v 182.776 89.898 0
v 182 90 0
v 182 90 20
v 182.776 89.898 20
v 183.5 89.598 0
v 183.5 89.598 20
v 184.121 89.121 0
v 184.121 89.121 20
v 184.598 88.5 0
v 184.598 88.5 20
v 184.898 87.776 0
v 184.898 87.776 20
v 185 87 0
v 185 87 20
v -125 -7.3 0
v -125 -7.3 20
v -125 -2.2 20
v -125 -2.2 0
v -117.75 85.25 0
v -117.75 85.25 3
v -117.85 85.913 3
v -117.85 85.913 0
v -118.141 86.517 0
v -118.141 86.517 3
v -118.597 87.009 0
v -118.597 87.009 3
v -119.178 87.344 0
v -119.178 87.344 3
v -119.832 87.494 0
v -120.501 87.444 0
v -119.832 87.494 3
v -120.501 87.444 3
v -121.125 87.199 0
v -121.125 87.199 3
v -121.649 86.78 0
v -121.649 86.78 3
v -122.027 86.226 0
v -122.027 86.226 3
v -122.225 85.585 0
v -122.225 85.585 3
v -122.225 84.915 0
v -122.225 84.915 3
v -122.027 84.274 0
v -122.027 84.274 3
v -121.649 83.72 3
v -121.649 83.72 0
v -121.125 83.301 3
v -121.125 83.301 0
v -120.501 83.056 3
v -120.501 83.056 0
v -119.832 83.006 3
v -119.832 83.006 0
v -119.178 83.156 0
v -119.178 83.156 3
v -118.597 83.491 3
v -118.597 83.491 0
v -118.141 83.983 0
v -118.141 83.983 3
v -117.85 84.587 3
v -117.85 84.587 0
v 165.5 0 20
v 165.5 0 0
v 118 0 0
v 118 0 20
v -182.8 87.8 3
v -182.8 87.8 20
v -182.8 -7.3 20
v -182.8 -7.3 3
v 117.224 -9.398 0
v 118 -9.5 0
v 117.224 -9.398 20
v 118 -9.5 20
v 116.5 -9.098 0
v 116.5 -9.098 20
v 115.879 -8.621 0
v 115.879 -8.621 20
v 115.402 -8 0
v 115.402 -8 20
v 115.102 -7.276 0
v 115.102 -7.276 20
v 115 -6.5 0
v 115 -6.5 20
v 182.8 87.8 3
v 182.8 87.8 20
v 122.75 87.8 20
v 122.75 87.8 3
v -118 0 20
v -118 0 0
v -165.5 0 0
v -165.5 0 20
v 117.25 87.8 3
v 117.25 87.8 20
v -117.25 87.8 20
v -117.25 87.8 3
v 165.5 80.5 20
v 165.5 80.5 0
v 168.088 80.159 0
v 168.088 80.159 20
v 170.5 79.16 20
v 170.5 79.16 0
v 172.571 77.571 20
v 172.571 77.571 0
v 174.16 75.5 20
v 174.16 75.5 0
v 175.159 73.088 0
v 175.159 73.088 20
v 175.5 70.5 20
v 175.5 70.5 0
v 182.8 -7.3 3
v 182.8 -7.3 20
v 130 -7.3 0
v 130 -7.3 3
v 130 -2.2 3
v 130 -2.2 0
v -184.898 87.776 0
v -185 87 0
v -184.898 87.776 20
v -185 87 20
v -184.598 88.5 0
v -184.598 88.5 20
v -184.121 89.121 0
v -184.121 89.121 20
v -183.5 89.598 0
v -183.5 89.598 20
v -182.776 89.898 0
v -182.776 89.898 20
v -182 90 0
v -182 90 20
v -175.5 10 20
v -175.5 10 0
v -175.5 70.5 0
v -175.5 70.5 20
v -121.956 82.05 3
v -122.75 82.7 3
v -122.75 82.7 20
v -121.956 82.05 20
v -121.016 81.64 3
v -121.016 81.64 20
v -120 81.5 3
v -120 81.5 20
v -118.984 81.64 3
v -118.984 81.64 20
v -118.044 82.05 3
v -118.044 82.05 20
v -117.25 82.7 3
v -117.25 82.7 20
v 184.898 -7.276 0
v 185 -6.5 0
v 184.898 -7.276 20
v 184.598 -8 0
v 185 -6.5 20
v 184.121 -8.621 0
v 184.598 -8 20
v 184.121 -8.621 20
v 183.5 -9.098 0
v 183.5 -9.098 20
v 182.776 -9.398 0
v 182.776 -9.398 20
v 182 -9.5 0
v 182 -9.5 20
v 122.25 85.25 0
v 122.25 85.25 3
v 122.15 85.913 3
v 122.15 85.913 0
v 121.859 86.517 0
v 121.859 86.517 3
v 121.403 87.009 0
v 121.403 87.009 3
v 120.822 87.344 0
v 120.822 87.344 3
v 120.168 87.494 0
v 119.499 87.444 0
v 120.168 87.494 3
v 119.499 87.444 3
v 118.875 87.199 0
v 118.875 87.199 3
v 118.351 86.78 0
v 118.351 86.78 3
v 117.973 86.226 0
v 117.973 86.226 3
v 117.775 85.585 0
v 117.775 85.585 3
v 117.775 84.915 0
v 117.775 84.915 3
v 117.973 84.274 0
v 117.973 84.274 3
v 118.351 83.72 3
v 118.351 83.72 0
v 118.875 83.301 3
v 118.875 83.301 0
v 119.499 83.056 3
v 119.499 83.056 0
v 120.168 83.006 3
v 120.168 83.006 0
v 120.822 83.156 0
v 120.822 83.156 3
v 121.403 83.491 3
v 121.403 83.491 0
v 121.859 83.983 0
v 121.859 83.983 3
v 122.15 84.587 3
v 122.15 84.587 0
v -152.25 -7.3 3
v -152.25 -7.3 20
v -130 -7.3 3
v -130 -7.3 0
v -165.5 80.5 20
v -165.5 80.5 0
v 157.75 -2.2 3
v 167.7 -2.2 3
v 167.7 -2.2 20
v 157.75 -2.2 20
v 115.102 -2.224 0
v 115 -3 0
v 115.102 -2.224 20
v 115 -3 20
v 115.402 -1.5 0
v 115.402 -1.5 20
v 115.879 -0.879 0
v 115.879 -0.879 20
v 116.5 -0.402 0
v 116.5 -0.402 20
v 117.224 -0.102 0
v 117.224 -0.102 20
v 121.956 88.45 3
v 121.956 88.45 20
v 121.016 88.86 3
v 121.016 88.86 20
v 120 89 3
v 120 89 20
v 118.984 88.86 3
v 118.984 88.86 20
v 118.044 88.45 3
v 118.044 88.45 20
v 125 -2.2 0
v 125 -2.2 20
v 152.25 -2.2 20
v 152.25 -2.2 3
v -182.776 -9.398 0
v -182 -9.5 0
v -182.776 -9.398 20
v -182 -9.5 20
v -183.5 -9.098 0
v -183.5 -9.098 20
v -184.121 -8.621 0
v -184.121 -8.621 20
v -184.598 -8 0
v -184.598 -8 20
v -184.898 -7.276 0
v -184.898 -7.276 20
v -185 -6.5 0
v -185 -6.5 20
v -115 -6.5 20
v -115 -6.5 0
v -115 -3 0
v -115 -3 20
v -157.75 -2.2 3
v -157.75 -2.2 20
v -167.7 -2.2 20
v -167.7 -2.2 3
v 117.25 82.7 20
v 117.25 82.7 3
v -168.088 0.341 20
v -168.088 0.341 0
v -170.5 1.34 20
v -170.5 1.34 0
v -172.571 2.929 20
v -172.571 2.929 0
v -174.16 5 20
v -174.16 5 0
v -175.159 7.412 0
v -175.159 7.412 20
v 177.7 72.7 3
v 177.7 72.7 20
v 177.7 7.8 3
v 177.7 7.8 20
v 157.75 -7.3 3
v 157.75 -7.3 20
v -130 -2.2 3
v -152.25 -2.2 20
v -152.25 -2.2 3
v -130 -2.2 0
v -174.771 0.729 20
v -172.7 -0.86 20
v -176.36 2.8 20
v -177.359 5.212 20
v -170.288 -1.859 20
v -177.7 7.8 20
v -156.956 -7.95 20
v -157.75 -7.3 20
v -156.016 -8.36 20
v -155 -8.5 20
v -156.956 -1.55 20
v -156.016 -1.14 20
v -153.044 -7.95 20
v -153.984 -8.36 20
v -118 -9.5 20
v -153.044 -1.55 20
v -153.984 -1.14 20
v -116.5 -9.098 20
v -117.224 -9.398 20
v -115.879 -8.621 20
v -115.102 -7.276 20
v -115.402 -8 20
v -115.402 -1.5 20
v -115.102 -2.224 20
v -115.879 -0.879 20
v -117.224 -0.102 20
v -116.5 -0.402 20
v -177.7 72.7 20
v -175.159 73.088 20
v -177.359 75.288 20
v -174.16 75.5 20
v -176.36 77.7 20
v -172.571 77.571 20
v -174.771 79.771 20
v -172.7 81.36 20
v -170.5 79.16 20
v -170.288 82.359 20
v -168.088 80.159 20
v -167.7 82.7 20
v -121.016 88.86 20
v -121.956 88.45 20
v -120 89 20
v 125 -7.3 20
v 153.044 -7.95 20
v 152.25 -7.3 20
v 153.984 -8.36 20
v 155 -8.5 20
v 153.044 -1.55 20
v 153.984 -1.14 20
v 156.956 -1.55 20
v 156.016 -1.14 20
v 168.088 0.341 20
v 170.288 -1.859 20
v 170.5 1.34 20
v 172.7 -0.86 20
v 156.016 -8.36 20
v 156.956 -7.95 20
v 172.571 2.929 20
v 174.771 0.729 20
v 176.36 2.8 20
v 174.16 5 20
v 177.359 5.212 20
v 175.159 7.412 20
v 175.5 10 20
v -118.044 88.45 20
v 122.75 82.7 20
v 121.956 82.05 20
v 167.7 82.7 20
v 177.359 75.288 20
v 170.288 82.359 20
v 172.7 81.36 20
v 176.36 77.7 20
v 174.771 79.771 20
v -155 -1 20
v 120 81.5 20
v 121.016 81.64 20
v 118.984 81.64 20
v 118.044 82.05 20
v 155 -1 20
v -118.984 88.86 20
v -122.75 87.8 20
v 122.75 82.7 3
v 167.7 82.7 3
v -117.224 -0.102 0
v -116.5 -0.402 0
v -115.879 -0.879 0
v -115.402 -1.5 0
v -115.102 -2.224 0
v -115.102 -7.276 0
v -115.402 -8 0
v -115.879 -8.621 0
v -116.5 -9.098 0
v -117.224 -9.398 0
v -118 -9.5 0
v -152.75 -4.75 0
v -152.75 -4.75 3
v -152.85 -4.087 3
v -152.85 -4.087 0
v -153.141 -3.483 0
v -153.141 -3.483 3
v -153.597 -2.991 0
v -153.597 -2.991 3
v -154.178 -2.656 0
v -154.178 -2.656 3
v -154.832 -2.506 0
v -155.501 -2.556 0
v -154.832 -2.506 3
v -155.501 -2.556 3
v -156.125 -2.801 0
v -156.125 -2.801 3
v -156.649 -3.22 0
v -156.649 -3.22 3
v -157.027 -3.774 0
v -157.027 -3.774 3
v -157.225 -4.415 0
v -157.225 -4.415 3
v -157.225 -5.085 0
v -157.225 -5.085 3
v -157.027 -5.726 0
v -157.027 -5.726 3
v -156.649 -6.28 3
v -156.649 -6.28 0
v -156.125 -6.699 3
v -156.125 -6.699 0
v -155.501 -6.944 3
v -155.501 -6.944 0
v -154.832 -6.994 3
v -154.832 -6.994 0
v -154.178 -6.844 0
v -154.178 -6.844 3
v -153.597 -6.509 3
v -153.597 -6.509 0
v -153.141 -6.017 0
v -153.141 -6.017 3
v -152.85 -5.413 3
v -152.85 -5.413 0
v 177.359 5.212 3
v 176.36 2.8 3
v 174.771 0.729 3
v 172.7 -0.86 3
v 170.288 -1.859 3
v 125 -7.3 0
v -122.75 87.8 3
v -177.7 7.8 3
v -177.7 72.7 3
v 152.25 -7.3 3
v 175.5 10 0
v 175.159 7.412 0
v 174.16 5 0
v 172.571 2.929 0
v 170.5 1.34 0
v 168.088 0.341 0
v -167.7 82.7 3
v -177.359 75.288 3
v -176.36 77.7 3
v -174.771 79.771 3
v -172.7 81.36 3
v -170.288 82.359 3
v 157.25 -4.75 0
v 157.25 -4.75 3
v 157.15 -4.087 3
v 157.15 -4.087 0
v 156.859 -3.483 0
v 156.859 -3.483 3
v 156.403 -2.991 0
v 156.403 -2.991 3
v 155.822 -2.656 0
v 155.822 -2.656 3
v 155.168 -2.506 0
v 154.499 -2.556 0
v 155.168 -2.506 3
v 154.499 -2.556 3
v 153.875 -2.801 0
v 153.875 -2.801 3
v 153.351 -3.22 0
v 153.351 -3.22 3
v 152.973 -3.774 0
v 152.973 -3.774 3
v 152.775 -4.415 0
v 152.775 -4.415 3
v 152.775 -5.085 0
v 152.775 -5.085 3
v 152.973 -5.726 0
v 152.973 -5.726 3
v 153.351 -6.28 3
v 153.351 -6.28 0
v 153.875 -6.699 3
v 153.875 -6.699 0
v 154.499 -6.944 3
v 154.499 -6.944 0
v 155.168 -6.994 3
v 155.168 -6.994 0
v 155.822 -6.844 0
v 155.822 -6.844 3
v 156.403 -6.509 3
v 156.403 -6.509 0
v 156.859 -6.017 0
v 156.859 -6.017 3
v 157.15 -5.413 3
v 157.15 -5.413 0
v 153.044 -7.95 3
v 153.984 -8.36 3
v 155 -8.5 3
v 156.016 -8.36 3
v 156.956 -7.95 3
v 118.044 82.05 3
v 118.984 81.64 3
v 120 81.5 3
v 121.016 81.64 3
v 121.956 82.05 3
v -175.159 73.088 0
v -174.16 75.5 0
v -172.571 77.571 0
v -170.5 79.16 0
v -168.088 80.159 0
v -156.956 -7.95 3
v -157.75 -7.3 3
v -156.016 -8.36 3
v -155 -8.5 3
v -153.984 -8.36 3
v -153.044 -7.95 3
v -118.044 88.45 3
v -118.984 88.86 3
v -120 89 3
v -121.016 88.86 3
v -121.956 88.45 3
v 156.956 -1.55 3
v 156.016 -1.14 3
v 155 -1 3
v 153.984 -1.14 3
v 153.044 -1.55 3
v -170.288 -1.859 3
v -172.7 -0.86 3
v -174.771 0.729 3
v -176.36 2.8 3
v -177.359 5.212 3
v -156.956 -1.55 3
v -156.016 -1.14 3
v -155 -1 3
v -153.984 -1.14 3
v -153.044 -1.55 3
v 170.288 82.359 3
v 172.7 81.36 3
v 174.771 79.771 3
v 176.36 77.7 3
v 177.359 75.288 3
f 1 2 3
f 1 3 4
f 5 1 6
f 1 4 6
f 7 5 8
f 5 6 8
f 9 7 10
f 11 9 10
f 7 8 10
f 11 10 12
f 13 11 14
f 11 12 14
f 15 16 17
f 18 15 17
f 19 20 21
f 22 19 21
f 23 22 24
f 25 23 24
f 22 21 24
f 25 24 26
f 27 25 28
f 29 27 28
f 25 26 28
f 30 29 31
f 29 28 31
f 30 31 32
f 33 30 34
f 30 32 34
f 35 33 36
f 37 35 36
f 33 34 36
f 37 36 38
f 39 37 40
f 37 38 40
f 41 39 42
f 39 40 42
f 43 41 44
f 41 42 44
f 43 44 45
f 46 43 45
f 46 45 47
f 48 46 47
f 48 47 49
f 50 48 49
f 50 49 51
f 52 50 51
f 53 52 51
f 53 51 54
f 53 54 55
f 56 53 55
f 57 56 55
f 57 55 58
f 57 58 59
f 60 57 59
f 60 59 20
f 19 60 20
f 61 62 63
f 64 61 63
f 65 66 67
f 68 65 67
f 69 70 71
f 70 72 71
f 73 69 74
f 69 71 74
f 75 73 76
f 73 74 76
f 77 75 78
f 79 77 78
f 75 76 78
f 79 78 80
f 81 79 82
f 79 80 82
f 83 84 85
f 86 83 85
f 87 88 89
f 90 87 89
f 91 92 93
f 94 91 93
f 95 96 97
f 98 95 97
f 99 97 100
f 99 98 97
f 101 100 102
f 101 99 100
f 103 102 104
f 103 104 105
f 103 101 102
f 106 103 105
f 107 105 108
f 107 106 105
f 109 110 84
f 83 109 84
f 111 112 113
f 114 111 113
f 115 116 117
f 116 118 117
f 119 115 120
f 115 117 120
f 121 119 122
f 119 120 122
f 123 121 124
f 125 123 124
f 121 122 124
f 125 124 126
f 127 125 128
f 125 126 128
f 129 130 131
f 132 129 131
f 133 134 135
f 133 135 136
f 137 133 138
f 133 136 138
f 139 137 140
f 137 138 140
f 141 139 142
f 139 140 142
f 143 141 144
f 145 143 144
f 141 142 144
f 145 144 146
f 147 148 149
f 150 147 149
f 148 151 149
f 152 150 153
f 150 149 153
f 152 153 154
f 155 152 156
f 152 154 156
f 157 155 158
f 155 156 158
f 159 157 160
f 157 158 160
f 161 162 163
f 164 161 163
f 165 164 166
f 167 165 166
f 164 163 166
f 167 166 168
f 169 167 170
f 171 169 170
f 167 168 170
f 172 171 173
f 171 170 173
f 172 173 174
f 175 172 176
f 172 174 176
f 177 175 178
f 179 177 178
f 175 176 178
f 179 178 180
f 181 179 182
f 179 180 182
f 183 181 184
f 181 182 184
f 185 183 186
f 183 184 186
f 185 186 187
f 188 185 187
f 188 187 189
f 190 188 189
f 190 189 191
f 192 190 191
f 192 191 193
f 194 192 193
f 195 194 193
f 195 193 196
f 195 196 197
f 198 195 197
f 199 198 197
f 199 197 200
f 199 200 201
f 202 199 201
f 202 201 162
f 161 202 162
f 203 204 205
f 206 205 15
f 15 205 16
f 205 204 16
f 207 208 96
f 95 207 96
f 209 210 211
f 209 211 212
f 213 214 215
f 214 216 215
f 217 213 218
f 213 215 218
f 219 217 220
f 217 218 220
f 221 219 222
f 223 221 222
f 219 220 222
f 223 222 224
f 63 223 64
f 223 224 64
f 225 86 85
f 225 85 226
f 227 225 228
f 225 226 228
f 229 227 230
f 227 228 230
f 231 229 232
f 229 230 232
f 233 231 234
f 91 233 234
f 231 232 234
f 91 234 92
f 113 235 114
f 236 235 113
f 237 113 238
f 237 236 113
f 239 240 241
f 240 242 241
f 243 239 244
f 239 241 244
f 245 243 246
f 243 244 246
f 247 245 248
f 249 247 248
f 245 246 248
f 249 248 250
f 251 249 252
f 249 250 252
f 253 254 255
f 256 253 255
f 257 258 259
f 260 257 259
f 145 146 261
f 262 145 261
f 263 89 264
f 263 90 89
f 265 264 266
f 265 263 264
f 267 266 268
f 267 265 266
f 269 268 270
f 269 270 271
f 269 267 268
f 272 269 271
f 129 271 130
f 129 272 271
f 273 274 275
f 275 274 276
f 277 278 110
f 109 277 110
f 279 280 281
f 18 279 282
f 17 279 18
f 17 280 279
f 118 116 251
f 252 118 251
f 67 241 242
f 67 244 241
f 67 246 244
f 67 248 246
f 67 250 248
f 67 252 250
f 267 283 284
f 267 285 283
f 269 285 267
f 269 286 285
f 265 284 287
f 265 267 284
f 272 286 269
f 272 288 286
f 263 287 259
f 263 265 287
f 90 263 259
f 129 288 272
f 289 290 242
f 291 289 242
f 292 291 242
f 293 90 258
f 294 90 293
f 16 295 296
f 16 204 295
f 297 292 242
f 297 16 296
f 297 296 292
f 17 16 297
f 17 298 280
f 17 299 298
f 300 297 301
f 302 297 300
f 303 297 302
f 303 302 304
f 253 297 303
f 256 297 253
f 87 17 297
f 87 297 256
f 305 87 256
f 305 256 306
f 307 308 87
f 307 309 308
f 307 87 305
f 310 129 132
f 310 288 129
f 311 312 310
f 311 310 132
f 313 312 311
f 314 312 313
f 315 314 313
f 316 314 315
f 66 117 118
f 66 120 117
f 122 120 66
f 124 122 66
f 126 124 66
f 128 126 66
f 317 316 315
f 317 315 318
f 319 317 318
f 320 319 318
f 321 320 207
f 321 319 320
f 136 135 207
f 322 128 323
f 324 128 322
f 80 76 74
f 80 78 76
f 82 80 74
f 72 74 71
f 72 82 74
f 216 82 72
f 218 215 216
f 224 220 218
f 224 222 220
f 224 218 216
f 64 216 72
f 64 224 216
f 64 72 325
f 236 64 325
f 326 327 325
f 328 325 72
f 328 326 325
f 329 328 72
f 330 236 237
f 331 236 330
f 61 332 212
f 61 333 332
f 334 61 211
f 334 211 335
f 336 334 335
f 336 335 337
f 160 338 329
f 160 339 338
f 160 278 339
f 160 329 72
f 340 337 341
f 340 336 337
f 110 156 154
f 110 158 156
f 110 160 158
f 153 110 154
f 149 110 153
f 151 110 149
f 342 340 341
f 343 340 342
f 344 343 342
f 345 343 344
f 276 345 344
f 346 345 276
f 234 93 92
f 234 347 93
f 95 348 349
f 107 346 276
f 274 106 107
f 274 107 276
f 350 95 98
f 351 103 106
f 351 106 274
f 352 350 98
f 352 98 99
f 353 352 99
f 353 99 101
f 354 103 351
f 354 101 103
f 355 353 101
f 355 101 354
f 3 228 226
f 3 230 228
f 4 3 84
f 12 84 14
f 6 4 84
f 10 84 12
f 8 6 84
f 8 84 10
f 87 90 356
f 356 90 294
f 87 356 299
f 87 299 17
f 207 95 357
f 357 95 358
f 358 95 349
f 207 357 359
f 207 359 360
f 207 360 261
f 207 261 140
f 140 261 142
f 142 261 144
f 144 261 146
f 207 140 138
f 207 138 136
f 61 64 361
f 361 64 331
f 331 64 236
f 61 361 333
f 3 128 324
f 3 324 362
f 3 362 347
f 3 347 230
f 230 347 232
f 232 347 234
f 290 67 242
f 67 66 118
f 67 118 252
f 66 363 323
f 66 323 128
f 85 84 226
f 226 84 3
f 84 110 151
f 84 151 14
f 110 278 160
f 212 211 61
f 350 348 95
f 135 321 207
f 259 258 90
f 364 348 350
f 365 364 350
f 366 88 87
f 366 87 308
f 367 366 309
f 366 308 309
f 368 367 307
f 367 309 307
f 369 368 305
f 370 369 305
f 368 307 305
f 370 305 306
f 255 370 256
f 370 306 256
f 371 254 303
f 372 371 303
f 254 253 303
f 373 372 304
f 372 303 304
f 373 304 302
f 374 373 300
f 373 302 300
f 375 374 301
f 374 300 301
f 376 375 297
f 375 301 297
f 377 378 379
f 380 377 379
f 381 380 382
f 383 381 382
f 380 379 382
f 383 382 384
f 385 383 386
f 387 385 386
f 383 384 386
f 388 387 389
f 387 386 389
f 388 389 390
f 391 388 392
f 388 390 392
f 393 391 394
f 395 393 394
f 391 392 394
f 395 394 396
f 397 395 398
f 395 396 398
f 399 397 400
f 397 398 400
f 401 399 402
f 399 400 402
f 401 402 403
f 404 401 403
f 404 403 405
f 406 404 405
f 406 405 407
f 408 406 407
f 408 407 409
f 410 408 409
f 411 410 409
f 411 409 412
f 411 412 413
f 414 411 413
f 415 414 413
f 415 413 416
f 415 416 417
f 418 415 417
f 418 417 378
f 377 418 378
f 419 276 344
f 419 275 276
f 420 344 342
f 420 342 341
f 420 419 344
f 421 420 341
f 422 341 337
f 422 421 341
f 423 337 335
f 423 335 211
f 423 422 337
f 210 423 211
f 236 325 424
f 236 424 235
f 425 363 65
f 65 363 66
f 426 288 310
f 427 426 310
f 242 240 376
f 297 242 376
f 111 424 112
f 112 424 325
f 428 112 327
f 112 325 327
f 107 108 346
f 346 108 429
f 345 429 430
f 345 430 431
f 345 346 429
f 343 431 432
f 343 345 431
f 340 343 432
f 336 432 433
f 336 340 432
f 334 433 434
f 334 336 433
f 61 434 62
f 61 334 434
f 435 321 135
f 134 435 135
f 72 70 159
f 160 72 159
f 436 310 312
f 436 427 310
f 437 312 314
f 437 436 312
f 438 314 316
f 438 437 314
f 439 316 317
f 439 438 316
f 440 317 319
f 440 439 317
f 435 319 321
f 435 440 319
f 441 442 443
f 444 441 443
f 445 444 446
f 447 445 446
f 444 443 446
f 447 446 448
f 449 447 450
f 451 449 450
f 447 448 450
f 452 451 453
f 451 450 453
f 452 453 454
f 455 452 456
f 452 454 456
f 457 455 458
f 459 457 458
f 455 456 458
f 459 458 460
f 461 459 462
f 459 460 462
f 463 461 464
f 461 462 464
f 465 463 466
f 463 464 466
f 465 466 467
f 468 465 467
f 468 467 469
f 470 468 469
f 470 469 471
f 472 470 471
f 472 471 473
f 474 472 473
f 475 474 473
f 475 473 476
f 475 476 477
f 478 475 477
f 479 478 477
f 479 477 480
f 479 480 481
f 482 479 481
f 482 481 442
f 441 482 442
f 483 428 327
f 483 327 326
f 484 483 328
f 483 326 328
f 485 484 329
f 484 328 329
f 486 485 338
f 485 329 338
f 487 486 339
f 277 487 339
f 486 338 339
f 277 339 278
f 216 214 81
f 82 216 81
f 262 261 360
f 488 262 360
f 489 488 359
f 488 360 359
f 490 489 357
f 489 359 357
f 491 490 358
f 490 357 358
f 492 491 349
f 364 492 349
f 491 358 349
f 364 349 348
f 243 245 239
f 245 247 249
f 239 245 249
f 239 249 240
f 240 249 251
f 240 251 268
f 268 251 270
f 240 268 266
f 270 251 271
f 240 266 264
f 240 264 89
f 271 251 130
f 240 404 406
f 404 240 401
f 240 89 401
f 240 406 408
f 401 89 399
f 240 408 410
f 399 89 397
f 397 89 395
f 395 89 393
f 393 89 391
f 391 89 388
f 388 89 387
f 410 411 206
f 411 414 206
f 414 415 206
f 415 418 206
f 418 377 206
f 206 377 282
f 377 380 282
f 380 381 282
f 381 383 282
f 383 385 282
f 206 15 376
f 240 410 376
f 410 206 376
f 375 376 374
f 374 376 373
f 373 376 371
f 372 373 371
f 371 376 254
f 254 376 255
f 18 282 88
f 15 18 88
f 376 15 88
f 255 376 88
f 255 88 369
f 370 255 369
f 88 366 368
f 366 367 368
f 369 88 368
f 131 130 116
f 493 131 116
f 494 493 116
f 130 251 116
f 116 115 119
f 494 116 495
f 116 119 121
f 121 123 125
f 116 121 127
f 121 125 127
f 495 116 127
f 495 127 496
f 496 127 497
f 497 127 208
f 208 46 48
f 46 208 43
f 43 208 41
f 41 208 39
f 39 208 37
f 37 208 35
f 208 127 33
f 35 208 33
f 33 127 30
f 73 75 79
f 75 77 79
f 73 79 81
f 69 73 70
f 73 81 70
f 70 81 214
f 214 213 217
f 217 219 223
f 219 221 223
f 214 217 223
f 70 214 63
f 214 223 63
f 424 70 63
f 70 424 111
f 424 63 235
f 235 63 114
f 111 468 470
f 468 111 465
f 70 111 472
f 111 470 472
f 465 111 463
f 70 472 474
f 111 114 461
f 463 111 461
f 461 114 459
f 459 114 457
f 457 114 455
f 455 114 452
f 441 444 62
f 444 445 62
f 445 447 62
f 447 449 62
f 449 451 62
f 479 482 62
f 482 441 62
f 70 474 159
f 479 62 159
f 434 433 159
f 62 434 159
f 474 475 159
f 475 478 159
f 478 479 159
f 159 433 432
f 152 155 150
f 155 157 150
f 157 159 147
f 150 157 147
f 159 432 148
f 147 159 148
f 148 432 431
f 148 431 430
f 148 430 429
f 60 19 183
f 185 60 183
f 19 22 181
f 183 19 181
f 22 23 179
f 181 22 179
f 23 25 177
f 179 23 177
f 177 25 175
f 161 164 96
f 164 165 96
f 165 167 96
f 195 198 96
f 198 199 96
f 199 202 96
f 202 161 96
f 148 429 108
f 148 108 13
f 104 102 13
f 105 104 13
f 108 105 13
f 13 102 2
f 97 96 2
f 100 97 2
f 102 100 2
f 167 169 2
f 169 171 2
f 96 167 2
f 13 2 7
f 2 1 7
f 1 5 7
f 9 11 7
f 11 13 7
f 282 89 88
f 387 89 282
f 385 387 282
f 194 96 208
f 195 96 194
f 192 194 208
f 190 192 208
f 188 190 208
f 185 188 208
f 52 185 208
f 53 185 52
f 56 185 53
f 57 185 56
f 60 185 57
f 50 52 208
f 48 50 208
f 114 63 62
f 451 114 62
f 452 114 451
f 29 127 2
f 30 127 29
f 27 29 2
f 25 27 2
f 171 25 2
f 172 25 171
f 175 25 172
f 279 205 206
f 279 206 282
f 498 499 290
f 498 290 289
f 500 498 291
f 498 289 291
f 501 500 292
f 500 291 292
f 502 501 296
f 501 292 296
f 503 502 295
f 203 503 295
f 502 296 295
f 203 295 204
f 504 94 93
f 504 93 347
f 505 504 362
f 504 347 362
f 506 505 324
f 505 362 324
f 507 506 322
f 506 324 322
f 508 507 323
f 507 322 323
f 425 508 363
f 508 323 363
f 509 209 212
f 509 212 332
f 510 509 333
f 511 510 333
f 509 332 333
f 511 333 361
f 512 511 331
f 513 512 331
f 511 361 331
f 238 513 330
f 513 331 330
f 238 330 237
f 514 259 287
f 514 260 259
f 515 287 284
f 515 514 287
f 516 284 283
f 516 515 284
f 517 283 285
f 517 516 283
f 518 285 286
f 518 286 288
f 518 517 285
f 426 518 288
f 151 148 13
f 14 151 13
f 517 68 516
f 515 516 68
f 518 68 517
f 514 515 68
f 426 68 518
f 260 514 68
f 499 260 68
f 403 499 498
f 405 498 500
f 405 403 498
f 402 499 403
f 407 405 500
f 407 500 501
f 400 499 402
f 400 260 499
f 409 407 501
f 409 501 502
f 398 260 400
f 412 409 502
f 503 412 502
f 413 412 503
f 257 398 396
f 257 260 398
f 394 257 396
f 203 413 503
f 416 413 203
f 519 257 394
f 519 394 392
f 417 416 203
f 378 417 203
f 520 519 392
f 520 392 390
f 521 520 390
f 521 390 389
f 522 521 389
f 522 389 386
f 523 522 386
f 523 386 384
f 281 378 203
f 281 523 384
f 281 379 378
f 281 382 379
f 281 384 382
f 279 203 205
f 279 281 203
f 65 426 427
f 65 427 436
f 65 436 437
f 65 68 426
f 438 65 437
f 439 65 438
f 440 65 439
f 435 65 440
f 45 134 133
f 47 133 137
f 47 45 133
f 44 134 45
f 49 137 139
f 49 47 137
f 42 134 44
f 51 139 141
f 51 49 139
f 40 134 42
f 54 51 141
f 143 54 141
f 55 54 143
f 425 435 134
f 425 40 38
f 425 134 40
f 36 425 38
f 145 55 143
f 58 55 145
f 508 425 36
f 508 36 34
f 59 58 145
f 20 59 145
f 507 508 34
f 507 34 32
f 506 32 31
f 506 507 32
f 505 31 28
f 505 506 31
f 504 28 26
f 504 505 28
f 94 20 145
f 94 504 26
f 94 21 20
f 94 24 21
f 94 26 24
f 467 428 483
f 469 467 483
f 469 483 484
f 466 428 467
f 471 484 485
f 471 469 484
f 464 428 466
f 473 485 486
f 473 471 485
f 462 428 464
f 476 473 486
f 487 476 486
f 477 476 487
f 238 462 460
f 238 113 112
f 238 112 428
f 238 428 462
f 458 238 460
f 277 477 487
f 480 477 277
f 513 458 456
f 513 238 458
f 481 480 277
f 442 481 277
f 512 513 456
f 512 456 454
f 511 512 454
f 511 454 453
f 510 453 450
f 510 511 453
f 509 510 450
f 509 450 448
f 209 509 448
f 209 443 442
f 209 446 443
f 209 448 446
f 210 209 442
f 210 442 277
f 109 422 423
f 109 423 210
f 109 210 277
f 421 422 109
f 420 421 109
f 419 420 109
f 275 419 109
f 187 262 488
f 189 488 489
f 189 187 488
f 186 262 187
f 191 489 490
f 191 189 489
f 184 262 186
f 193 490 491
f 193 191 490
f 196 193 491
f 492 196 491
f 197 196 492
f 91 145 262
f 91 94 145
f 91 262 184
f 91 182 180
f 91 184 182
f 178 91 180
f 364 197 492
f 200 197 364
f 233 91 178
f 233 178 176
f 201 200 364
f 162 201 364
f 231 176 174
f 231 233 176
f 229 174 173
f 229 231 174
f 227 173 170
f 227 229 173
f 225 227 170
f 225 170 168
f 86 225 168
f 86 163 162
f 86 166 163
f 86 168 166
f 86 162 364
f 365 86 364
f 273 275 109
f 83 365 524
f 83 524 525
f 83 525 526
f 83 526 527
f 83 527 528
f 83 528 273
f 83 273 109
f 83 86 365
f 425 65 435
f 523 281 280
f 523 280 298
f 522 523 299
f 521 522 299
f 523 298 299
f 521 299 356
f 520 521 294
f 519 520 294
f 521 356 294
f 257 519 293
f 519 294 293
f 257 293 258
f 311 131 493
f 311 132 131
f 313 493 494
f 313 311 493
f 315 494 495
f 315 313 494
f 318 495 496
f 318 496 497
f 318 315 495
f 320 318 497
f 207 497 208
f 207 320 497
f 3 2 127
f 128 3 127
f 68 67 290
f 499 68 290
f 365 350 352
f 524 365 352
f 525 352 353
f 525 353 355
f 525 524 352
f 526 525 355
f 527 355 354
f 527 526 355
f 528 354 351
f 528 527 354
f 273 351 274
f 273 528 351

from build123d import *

# Parameters (mm, degrees)
BOSS_EXTRUDE1_DEPTH     = 20
CUT_EXTRUDE_THIN1_DEPTH = 17
FILLET1_R               = 10
SKETCH3_R               = 3.75
SKETCH3_R_2             = 2.25
CUT_EXTRUDE1_DEPTH      = 17
SKETCH3_2_R             = 2.25
CUT_EXTRUDE2_DEPTH      = 207.700266086
FILLET2_R               = 3
SKETCH4_W               = 5
SKETCH4_H               = 5.1
CUT_EXTRUDE3_DEPTH      = 207.43158673


with BuildPart() as part:
    # Sketch1 → Boss-Extrude1 (new body)
    with BuildSketch(Plane.XY):
        Polygon((-115, 0), (-175.5, 0), (-175.5, 80.5), (175.5, 80.5), (175.5, 0), (115, 0), (115, -9.5), (185, -9.5), (185, 90), (-185, 90), (-185, -9.5), (-115, -9.5), align=None)
    extrude(amount=BOSS_EXTRUDE1_DEPTH)

    # Sketch2 → Cut-Extrude-Thin1 (cut)
    with BuildSketch(Plane.XY.offset(20)):
        Polygon((-125, -2.2), (-177.7, -2.2), (-177.7, 82.7), (177.7, 82.7), (177.7, -2.2), (125, -2.2), (125, -7.3), (182.8, -7.3), (182.8, 87.8), (-182.8, 87.8), (-182.8, -7.3), (-125, -7.3), align=None)
    extrude(amount=-CUT_EXTRUDE_THIN1_DEPTH, mode=Mode.SUBTRACT)

    # Fillet1
    fillet1_edges = [part.edges().sort_by_distance(p)[0] for p in [
        (175.5, 0, 10),
        (175.5, 80.5, 10),
        (-175.5, 80.5, 10),
        (-175.5, 0, 10),
        (-177.7, -2.2, 11.5),
        (-177.7, 82.7, 11.5),
        (177.7, 82.7, 11.5),
        (177.7, -2.2, 11.5),
    ]]
    fillet(fillet1_edges, radius=FILLET1_R)

    # Sketch3 → Cut-Extrude1 (cut)
    # profile 1 of 4: a face of its own
    with BuildSketch(Plane.XY.offset(20)):
        with Locations((-120, 85.25)):
            Circle(SKETCH3_R)
        with Locations((-120, 85.25)):
            Circle(SKETCH3_R_2, mode=Mode.SUBTRACT)
    # profile 2 of 4: a face of its own
    with BuildSketch(Plane.XY.offset(20)):
        with Locations((120, 85.25)):
            Circle(SKETCH3_R)
        with Locations((120, 85.25)):
            Circle(SKETCH3_R_2, mode=Mode.SUBTRACT)
    # profile 3 of 4: a face of its own
    with BuildSketch(Plane.XY.offset(20)):
        with Locations((-155, -4.75)):
            Circle(SKETCH3_R)
        with Locations((-155, -4.75)):
            Circle(SKETCH3_R_2, mode=Mode.SUBTRACT)
    # profile 4 of 4: a face of its own
    with BuildSketch(Plane.XY.offset(20)):
        with Locations((155, -4.75)):
            Circle(SKETCH3_R)
        with Locations((155, -4.75)):
            Circle(SKETCH3_R_2, mode=Mode.SUBTRACT)
    extrude(amount=-CUT_EXTRUDE1_DEPTH, mode=Mode.SUBTRACT)

    # Sketch3<2> → Cut-Extrude2 (cut, through all)
    with BuildSketch(Plane.XY.offset(20)):
        with Locations((-120, 85.25)):
            Circle(SKETCH3_2_R)
        with Locations((-155, -4.75)):
            Circle(SKETCH3_2_R)
        with Locations((155, -4.75)):
            Circle(SKETCH3_2_R)
        with Locations((120, 85.25)):
            Circle(SKETCH3_2_R)
    extrude(amount=-CUT_EXTRUDE2_DEPTH, mode=Mode.SUBTRACT)

    # Fillet2
    fillet2_edges = [part.edges().sort_by_distance(p)[0] for p in [
        (-115, -9.5, 10),
        (-185, -9.5, 10),
        (-185, 90, 10),
        (185, 90, 10),
        (185, -9.5, 10),
        (115, -9.5, 10),
        (115, 0, 10),
        (-115, 0, 10),
    ]]
    fillet(fillet2_edges, radius=FILLET2_R)

    # Sketch4 → Cut-Extrude3 (cut, through all)
    with BuildSketch(Plane.XY.offset(3)):
        with Locations((-127.5, -4.75)):
            Rectangle(SKETCH4_W, SKETCH4_H)
        with Locations((127.5, -4.75)):
            Rectangle(SKETCH4_W, SKETCH4_H)
    extrude(amount=-CUT_EXTRUDE3_DEPTH, mode=Mode.SUBTRACT)


solid = part.part
